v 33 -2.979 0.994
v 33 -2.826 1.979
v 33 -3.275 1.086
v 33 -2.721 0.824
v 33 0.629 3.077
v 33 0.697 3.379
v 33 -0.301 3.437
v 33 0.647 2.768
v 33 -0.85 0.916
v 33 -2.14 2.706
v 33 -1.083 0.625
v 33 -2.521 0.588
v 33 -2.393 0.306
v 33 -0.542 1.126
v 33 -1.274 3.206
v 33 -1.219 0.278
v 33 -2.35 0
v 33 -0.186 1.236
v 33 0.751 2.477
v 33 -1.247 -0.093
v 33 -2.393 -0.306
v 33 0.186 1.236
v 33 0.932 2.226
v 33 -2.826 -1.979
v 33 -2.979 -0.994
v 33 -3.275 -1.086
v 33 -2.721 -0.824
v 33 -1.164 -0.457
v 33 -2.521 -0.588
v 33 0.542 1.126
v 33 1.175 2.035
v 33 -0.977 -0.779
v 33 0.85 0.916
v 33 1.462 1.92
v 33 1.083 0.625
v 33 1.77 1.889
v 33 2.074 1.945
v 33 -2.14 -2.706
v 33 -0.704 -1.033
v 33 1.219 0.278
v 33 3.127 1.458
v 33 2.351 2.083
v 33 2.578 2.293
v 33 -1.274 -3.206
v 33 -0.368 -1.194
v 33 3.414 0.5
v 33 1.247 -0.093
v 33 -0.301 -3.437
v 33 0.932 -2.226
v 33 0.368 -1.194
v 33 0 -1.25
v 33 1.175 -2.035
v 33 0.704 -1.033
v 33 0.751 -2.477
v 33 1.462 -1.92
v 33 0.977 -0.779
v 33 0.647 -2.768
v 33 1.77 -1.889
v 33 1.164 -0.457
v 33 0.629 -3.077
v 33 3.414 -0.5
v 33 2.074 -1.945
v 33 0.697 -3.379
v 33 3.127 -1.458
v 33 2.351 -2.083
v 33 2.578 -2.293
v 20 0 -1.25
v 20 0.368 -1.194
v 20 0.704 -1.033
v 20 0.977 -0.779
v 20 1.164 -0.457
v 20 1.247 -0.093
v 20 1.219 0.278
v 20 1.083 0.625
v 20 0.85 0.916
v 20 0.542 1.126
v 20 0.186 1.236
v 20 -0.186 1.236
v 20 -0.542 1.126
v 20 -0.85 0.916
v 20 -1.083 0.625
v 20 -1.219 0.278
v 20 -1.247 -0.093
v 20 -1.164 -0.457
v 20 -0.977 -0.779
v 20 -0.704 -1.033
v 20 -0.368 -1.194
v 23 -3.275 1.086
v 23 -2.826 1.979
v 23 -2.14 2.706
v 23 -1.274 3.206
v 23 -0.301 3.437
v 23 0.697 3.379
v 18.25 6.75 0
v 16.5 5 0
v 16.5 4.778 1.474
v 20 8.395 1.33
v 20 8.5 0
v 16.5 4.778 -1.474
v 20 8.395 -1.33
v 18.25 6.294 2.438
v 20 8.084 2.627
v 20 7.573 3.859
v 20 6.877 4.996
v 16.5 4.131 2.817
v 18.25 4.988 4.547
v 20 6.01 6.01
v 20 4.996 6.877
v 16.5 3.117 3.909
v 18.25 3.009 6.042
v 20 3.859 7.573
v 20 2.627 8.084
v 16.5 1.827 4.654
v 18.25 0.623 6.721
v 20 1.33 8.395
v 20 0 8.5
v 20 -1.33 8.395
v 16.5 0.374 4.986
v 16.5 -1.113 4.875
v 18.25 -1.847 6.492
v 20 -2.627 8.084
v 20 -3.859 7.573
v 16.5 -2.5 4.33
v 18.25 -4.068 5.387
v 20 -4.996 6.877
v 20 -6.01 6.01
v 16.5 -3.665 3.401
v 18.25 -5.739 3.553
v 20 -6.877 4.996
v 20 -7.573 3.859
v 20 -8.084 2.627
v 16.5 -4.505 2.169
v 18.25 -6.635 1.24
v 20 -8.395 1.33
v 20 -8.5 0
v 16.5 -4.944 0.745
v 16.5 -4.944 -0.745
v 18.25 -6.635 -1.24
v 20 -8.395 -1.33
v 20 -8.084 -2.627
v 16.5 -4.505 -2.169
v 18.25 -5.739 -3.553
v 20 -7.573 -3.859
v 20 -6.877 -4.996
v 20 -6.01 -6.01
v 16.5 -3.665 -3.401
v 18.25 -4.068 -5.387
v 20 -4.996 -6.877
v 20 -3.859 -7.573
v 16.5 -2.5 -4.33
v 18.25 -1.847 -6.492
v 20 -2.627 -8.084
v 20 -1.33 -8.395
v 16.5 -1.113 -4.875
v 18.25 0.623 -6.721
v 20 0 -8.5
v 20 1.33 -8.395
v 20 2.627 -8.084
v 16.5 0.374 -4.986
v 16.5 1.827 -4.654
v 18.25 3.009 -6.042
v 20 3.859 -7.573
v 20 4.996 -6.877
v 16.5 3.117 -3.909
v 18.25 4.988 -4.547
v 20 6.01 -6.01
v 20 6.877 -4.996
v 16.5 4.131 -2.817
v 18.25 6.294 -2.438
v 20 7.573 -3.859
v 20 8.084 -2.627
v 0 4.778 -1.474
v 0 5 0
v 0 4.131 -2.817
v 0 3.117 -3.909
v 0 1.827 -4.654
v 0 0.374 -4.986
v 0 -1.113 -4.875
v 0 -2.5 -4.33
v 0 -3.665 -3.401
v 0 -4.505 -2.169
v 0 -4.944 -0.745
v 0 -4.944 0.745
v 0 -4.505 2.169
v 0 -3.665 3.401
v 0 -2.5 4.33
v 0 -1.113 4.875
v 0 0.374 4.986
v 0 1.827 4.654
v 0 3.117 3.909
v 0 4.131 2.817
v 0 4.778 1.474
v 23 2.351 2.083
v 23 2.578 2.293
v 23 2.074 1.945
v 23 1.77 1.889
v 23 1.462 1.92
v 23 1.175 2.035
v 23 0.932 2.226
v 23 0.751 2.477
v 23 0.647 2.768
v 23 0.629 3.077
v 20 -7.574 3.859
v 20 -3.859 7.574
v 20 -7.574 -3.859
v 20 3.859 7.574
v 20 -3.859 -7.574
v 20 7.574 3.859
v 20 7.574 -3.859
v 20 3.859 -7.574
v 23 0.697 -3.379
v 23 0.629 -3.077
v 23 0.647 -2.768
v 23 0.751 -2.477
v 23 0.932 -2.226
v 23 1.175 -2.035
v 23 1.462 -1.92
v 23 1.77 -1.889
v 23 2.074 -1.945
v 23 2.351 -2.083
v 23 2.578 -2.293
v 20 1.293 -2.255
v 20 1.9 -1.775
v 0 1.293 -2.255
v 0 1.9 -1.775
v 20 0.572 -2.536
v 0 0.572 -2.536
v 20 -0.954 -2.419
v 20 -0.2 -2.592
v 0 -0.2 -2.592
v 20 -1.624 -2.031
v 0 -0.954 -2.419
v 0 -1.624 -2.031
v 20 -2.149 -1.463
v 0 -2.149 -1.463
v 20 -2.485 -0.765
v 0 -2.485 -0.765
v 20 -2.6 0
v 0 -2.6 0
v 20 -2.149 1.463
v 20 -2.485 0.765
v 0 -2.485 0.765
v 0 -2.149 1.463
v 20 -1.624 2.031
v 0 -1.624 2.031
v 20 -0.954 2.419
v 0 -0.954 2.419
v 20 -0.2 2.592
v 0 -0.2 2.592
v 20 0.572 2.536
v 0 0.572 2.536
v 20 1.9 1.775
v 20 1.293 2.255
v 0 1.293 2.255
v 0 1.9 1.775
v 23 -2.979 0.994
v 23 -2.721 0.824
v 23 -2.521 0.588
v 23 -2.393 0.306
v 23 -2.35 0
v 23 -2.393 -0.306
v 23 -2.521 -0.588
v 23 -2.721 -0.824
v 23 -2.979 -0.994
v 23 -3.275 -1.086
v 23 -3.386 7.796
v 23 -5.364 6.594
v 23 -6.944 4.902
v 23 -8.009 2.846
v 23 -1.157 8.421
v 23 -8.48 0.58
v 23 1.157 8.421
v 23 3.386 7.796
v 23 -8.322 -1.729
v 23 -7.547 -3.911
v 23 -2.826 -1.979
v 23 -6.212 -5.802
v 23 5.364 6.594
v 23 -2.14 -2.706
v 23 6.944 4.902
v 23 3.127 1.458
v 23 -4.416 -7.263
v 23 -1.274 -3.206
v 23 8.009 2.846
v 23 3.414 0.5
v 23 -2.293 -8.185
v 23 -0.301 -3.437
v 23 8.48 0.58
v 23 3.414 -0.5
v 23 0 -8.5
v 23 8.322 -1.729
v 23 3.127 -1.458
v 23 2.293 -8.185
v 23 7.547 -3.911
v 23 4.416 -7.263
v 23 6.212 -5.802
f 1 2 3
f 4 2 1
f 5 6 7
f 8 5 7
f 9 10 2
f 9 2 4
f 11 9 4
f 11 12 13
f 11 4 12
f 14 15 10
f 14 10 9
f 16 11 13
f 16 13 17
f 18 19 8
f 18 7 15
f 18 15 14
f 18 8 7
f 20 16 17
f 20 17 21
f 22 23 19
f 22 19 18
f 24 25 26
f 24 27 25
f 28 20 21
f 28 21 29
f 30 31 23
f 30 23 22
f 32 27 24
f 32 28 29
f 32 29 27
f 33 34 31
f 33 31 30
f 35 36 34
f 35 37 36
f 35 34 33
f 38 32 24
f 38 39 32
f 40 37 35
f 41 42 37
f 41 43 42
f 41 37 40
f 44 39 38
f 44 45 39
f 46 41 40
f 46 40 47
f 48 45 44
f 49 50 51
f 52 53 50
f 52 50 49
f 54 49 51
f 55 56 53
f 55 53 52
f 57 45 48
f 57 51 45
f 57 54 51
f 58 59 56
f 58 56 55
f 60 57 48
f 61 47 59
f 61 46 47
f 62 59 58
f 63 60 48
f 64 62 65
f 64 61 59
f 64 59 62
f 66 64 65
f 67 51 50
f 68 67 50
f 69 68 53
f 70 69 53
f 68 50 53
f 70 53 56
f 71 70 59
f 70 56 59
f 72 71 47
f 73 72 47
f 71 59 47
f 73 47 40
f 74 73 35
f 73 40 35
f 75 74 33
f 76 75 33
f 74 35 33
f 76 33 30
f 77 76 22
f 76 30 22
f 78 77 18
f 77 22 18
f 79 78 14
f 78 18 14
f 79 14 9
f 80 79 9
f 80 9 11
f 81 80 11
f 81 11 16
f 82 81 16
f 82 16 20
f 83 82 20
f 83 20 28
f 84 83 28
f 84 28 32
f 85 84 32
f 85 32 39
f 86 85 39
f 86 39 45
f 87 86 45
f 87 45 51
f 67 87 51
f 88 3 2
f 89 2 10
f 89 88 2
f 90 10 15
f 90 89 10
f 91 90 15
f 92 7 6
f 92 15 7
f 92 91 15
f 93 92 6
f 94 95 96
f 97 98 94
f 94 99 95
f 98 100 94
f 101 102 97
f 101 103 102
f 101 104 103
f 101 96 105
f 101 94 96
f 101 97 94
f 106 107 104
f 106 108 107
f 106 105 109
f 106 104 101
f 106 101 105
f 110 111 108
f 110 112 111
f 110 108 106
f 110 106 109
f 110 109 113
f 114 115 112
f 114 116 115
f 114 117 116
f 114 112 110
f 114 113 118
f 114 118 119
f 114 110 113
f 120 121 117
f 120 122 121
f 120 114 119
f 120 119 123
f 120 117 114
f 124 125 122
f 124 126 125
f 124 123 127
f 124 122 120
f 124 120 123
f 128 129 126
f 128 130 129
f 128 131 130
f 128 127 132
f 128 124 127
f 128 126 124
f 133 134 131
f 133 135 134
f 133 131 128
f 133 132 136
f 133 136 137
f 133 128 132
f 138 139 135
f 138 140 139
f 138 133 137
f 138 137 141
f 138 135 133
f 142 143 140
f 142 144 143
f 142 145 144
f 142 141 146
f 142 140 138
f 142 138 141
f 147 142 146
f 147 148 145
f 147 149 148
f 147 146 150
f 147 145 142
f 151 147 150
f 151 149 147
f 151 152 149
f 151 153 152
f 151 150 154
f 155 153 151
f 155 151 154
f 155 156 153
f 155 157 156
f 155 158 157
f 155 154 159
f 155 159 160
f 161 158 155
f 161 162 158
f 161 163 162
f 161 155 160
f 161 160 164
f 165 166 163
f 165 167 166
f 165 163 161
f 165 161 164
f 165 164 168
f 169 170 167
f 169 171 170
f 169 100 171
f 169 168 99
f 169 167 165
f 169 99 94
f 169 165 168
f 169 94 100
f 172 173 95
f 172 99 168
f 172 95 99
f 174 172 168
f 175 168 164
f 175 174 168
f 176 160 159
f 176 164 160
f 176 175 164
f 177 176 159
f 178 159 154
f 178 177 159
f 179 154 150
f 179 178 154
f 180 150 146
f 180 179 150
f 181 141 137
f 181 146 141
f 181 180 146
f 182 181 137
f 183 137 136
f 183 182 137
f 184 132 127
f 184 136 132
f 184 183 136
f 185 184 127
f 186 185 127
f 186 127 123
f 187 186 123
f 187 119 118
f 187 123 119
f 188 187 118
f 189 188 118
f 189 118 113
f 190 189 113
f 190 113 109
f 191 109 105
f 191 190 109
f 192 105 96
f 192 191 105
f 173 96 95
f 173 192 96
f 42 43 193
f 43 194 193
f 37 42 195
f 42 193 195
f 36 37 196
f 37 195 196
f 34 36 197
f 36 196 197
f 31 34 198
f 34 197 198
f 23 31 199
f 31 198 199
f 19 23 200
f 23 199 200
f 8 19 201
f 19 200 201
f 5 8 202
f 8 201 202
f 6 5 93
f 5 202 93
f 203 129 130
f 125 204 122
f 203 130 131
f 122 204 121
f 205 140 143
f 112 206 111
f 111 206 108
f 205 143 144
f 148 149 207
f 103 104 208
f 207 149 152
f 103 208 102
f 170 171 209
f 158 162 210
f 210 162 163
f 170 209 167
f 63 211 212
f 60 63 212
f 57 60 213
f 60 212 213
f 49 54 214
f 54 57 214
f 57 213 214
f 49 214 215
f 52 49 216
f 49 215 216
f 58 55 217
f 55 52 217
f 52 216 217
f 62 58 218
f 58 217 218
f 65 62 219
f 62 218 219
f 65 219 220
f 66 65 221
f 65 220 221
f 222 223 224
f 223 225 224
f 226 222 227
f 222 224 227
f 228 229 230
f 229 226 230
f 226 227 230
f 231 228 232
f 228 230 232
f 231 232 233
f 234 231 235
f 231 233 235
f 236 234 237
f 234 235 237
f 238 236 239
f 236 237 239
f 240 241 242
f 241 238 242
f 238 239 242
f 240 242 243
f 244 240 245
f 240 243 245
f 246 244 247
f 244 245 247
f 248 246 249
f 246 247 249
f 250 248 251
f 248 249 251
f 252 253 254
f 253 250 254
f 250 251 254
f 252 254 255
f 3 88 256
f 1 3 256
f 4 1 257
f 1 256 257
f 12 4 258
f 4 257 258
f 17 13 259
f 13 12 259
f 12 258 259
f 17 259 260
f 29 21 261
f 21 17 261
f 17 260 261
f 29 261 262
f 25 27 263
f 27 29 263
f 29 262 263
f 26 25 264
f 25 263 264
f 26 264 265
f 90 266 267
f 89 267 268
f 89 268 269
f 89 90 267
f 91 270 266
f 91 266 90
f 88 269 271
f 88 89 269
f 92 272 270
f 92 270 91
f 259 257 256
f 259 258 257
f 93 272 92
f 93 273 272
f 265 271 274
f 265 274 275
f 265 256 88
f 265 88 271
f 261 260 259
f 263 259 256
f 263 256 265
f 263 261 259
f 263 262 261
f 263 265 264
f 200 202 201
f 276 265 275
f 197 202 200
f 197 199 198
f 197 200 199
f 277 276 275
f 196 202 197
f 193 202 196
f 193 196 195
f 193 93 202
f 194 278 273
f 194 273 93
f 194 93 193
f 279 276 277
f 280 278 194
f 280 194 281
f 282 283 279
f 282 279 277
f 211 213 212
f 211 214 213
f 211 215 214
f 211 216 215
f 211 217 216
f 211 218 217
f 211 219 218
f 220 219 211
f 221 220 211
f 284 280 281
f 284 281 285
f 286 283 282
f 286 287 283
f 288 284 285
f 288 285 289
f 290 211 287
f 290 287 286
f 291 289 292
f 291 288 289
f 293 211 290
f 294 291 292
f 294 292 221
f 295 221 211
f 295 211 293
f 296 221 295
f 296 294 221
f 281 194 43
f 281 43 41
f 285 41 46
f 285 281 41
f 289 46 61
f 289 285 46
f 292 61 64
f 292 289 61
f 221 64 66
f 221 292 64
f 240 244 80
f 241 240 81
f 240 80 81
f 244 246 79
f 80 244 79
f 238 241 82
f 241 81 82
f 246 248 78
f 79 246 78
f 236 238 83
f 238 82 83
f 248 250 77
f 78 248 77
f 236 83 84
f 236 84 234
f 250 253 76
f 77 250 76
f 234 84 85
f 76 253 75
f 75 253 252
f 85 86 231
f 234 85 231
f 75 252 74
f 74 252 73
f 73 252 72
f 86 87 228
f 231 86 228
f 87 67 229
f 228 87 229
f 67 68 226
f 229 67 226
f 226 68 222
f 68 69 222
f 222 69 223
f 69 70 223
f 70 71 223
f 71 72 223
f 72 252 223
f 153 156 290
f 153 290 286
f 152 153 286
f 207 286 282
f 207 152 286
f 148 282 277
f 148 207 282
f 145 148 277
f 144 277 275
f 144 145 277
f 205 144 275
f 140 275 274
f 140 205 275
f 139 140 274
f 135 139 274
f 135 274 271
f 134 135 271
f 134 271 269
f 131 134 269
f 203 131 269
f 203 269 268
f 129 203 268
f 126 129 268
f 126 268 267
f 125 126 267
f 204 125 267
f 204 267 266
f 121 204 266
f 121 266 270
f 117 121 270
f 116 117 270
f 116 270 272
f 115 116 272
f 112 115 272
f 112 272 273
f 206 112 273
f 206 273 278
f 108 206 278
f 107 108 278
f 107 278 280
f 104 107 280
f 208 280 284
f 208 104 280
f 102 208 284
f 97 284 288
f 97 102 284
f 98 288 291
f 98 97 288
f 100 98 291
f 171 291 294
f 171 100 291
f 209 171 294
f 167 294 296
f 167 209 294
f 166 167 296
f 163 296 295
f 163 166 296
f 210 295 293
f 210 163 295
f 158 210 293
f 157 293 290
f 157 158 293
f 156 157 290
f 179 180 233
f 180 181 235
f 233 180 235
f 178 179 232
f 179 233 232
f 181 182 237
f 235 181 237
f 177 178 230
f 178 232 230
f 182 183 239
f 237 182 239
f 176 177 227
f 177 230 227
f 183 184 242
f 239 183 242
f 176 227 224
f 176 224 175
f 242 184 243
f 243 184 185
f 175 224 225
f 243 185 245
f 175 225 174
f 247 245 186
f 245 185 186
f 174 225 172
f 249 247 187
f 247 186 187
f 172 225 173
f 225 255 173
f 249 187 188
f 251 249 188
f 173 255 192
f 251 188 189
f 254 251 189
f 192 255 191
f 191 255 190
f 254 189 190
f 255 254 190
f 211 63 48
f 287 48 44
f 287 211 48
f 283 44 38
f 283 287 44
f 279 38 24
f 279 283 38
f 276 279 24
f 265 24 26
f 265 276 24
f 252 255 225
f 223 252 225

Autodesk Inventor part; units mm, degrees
ref_plane "YZ Plane" through (0, 0, 0) normal (1, 0, 0) x (0, 1, 0)
ref_plane "XZ Plane" through (0, 0, 0) normal (0, 1, 0) x (-1, 0, 0)
ref_plane "XY Plane" through (0, 0, 0) normal (0, 0, 1) x (1, 0, 0)
sketch "Эскиз1" plane through (0, 0, 0) normal (1, 0, 0) x (0, 1, 0)
  arc A0 (1.9, 1.7748) -> (1.9, -1.7748) centre (0, 0) ccw
  line L0 (0, 0) -> (1.9, 0)
  line L1 (1.9, 0) -> (1.9, -1.7748)
  line L2 (1.9, 0) -> (1.9, 1.7748)
  circle A1 centre (0, 0) radius 5
  dimension "d0" = 5.2
  dimension "d1" = 1.9
  dimension "d2" = 10
extrude "Выдавливание1" add sketch "Эскиз1" along normal blind 20
sketch "Эскиз2" plane through (20, 0, 0) normal (1, 0, 0) x (0, 0, -1)
  circle A0 centre (0, 0) radius 3.45
  circle A1 centre (0, -3.45) radius 1.1
  circle A2 centre (2.9878, 1.725) radius 1.1
  circle A3 centre (-2.9878, 1.725) radius 1.1
  circle A4 centre (0, 0) radius 8.5
  point P0 (-2.293, 2.5778)
  point P1 (-3.3789, 0.6969)
  point P2 (-1.0859, -3.2746)
  point P3 (1.0859, -3.2746)
  point P4 (3.3789, 0.6969)
  point P5 (2.293, 2.5778)
  dimension "d5" = 6.9
  dimension "d6" = 2.2
  dimension "d9" = 360
  dimension "d13" = 17
extrude "Выдавливание2" add sketch "Эскиз2" along normal blind 13 contours A0 A1 A3 A2
sketch "Эскиз3" plane through (20, 0, 0) normal (1, 0, 0) x (0, 0, -1)
  circle A0 centre (0, 0) radius 8.5
  dimension "d14" = 17
extrude "Выдавливание3" add sketch "Эскиз3" along normal blind 3
chamfer "Фаска1" distance 3.5 angle 45 1 edges at (20, -5, 0)
sketch "Эскиз4" plane through (33, 0, 0) normal (1, 0, 0) x (0, 0, -1)
  circle A0 centre (0, 0) radius 1.25
  dimension "d20" = 2.5
extrude "Выдавливание4" cut sketch "Эскиз4" against normal through all
properties part number "передача момента"
